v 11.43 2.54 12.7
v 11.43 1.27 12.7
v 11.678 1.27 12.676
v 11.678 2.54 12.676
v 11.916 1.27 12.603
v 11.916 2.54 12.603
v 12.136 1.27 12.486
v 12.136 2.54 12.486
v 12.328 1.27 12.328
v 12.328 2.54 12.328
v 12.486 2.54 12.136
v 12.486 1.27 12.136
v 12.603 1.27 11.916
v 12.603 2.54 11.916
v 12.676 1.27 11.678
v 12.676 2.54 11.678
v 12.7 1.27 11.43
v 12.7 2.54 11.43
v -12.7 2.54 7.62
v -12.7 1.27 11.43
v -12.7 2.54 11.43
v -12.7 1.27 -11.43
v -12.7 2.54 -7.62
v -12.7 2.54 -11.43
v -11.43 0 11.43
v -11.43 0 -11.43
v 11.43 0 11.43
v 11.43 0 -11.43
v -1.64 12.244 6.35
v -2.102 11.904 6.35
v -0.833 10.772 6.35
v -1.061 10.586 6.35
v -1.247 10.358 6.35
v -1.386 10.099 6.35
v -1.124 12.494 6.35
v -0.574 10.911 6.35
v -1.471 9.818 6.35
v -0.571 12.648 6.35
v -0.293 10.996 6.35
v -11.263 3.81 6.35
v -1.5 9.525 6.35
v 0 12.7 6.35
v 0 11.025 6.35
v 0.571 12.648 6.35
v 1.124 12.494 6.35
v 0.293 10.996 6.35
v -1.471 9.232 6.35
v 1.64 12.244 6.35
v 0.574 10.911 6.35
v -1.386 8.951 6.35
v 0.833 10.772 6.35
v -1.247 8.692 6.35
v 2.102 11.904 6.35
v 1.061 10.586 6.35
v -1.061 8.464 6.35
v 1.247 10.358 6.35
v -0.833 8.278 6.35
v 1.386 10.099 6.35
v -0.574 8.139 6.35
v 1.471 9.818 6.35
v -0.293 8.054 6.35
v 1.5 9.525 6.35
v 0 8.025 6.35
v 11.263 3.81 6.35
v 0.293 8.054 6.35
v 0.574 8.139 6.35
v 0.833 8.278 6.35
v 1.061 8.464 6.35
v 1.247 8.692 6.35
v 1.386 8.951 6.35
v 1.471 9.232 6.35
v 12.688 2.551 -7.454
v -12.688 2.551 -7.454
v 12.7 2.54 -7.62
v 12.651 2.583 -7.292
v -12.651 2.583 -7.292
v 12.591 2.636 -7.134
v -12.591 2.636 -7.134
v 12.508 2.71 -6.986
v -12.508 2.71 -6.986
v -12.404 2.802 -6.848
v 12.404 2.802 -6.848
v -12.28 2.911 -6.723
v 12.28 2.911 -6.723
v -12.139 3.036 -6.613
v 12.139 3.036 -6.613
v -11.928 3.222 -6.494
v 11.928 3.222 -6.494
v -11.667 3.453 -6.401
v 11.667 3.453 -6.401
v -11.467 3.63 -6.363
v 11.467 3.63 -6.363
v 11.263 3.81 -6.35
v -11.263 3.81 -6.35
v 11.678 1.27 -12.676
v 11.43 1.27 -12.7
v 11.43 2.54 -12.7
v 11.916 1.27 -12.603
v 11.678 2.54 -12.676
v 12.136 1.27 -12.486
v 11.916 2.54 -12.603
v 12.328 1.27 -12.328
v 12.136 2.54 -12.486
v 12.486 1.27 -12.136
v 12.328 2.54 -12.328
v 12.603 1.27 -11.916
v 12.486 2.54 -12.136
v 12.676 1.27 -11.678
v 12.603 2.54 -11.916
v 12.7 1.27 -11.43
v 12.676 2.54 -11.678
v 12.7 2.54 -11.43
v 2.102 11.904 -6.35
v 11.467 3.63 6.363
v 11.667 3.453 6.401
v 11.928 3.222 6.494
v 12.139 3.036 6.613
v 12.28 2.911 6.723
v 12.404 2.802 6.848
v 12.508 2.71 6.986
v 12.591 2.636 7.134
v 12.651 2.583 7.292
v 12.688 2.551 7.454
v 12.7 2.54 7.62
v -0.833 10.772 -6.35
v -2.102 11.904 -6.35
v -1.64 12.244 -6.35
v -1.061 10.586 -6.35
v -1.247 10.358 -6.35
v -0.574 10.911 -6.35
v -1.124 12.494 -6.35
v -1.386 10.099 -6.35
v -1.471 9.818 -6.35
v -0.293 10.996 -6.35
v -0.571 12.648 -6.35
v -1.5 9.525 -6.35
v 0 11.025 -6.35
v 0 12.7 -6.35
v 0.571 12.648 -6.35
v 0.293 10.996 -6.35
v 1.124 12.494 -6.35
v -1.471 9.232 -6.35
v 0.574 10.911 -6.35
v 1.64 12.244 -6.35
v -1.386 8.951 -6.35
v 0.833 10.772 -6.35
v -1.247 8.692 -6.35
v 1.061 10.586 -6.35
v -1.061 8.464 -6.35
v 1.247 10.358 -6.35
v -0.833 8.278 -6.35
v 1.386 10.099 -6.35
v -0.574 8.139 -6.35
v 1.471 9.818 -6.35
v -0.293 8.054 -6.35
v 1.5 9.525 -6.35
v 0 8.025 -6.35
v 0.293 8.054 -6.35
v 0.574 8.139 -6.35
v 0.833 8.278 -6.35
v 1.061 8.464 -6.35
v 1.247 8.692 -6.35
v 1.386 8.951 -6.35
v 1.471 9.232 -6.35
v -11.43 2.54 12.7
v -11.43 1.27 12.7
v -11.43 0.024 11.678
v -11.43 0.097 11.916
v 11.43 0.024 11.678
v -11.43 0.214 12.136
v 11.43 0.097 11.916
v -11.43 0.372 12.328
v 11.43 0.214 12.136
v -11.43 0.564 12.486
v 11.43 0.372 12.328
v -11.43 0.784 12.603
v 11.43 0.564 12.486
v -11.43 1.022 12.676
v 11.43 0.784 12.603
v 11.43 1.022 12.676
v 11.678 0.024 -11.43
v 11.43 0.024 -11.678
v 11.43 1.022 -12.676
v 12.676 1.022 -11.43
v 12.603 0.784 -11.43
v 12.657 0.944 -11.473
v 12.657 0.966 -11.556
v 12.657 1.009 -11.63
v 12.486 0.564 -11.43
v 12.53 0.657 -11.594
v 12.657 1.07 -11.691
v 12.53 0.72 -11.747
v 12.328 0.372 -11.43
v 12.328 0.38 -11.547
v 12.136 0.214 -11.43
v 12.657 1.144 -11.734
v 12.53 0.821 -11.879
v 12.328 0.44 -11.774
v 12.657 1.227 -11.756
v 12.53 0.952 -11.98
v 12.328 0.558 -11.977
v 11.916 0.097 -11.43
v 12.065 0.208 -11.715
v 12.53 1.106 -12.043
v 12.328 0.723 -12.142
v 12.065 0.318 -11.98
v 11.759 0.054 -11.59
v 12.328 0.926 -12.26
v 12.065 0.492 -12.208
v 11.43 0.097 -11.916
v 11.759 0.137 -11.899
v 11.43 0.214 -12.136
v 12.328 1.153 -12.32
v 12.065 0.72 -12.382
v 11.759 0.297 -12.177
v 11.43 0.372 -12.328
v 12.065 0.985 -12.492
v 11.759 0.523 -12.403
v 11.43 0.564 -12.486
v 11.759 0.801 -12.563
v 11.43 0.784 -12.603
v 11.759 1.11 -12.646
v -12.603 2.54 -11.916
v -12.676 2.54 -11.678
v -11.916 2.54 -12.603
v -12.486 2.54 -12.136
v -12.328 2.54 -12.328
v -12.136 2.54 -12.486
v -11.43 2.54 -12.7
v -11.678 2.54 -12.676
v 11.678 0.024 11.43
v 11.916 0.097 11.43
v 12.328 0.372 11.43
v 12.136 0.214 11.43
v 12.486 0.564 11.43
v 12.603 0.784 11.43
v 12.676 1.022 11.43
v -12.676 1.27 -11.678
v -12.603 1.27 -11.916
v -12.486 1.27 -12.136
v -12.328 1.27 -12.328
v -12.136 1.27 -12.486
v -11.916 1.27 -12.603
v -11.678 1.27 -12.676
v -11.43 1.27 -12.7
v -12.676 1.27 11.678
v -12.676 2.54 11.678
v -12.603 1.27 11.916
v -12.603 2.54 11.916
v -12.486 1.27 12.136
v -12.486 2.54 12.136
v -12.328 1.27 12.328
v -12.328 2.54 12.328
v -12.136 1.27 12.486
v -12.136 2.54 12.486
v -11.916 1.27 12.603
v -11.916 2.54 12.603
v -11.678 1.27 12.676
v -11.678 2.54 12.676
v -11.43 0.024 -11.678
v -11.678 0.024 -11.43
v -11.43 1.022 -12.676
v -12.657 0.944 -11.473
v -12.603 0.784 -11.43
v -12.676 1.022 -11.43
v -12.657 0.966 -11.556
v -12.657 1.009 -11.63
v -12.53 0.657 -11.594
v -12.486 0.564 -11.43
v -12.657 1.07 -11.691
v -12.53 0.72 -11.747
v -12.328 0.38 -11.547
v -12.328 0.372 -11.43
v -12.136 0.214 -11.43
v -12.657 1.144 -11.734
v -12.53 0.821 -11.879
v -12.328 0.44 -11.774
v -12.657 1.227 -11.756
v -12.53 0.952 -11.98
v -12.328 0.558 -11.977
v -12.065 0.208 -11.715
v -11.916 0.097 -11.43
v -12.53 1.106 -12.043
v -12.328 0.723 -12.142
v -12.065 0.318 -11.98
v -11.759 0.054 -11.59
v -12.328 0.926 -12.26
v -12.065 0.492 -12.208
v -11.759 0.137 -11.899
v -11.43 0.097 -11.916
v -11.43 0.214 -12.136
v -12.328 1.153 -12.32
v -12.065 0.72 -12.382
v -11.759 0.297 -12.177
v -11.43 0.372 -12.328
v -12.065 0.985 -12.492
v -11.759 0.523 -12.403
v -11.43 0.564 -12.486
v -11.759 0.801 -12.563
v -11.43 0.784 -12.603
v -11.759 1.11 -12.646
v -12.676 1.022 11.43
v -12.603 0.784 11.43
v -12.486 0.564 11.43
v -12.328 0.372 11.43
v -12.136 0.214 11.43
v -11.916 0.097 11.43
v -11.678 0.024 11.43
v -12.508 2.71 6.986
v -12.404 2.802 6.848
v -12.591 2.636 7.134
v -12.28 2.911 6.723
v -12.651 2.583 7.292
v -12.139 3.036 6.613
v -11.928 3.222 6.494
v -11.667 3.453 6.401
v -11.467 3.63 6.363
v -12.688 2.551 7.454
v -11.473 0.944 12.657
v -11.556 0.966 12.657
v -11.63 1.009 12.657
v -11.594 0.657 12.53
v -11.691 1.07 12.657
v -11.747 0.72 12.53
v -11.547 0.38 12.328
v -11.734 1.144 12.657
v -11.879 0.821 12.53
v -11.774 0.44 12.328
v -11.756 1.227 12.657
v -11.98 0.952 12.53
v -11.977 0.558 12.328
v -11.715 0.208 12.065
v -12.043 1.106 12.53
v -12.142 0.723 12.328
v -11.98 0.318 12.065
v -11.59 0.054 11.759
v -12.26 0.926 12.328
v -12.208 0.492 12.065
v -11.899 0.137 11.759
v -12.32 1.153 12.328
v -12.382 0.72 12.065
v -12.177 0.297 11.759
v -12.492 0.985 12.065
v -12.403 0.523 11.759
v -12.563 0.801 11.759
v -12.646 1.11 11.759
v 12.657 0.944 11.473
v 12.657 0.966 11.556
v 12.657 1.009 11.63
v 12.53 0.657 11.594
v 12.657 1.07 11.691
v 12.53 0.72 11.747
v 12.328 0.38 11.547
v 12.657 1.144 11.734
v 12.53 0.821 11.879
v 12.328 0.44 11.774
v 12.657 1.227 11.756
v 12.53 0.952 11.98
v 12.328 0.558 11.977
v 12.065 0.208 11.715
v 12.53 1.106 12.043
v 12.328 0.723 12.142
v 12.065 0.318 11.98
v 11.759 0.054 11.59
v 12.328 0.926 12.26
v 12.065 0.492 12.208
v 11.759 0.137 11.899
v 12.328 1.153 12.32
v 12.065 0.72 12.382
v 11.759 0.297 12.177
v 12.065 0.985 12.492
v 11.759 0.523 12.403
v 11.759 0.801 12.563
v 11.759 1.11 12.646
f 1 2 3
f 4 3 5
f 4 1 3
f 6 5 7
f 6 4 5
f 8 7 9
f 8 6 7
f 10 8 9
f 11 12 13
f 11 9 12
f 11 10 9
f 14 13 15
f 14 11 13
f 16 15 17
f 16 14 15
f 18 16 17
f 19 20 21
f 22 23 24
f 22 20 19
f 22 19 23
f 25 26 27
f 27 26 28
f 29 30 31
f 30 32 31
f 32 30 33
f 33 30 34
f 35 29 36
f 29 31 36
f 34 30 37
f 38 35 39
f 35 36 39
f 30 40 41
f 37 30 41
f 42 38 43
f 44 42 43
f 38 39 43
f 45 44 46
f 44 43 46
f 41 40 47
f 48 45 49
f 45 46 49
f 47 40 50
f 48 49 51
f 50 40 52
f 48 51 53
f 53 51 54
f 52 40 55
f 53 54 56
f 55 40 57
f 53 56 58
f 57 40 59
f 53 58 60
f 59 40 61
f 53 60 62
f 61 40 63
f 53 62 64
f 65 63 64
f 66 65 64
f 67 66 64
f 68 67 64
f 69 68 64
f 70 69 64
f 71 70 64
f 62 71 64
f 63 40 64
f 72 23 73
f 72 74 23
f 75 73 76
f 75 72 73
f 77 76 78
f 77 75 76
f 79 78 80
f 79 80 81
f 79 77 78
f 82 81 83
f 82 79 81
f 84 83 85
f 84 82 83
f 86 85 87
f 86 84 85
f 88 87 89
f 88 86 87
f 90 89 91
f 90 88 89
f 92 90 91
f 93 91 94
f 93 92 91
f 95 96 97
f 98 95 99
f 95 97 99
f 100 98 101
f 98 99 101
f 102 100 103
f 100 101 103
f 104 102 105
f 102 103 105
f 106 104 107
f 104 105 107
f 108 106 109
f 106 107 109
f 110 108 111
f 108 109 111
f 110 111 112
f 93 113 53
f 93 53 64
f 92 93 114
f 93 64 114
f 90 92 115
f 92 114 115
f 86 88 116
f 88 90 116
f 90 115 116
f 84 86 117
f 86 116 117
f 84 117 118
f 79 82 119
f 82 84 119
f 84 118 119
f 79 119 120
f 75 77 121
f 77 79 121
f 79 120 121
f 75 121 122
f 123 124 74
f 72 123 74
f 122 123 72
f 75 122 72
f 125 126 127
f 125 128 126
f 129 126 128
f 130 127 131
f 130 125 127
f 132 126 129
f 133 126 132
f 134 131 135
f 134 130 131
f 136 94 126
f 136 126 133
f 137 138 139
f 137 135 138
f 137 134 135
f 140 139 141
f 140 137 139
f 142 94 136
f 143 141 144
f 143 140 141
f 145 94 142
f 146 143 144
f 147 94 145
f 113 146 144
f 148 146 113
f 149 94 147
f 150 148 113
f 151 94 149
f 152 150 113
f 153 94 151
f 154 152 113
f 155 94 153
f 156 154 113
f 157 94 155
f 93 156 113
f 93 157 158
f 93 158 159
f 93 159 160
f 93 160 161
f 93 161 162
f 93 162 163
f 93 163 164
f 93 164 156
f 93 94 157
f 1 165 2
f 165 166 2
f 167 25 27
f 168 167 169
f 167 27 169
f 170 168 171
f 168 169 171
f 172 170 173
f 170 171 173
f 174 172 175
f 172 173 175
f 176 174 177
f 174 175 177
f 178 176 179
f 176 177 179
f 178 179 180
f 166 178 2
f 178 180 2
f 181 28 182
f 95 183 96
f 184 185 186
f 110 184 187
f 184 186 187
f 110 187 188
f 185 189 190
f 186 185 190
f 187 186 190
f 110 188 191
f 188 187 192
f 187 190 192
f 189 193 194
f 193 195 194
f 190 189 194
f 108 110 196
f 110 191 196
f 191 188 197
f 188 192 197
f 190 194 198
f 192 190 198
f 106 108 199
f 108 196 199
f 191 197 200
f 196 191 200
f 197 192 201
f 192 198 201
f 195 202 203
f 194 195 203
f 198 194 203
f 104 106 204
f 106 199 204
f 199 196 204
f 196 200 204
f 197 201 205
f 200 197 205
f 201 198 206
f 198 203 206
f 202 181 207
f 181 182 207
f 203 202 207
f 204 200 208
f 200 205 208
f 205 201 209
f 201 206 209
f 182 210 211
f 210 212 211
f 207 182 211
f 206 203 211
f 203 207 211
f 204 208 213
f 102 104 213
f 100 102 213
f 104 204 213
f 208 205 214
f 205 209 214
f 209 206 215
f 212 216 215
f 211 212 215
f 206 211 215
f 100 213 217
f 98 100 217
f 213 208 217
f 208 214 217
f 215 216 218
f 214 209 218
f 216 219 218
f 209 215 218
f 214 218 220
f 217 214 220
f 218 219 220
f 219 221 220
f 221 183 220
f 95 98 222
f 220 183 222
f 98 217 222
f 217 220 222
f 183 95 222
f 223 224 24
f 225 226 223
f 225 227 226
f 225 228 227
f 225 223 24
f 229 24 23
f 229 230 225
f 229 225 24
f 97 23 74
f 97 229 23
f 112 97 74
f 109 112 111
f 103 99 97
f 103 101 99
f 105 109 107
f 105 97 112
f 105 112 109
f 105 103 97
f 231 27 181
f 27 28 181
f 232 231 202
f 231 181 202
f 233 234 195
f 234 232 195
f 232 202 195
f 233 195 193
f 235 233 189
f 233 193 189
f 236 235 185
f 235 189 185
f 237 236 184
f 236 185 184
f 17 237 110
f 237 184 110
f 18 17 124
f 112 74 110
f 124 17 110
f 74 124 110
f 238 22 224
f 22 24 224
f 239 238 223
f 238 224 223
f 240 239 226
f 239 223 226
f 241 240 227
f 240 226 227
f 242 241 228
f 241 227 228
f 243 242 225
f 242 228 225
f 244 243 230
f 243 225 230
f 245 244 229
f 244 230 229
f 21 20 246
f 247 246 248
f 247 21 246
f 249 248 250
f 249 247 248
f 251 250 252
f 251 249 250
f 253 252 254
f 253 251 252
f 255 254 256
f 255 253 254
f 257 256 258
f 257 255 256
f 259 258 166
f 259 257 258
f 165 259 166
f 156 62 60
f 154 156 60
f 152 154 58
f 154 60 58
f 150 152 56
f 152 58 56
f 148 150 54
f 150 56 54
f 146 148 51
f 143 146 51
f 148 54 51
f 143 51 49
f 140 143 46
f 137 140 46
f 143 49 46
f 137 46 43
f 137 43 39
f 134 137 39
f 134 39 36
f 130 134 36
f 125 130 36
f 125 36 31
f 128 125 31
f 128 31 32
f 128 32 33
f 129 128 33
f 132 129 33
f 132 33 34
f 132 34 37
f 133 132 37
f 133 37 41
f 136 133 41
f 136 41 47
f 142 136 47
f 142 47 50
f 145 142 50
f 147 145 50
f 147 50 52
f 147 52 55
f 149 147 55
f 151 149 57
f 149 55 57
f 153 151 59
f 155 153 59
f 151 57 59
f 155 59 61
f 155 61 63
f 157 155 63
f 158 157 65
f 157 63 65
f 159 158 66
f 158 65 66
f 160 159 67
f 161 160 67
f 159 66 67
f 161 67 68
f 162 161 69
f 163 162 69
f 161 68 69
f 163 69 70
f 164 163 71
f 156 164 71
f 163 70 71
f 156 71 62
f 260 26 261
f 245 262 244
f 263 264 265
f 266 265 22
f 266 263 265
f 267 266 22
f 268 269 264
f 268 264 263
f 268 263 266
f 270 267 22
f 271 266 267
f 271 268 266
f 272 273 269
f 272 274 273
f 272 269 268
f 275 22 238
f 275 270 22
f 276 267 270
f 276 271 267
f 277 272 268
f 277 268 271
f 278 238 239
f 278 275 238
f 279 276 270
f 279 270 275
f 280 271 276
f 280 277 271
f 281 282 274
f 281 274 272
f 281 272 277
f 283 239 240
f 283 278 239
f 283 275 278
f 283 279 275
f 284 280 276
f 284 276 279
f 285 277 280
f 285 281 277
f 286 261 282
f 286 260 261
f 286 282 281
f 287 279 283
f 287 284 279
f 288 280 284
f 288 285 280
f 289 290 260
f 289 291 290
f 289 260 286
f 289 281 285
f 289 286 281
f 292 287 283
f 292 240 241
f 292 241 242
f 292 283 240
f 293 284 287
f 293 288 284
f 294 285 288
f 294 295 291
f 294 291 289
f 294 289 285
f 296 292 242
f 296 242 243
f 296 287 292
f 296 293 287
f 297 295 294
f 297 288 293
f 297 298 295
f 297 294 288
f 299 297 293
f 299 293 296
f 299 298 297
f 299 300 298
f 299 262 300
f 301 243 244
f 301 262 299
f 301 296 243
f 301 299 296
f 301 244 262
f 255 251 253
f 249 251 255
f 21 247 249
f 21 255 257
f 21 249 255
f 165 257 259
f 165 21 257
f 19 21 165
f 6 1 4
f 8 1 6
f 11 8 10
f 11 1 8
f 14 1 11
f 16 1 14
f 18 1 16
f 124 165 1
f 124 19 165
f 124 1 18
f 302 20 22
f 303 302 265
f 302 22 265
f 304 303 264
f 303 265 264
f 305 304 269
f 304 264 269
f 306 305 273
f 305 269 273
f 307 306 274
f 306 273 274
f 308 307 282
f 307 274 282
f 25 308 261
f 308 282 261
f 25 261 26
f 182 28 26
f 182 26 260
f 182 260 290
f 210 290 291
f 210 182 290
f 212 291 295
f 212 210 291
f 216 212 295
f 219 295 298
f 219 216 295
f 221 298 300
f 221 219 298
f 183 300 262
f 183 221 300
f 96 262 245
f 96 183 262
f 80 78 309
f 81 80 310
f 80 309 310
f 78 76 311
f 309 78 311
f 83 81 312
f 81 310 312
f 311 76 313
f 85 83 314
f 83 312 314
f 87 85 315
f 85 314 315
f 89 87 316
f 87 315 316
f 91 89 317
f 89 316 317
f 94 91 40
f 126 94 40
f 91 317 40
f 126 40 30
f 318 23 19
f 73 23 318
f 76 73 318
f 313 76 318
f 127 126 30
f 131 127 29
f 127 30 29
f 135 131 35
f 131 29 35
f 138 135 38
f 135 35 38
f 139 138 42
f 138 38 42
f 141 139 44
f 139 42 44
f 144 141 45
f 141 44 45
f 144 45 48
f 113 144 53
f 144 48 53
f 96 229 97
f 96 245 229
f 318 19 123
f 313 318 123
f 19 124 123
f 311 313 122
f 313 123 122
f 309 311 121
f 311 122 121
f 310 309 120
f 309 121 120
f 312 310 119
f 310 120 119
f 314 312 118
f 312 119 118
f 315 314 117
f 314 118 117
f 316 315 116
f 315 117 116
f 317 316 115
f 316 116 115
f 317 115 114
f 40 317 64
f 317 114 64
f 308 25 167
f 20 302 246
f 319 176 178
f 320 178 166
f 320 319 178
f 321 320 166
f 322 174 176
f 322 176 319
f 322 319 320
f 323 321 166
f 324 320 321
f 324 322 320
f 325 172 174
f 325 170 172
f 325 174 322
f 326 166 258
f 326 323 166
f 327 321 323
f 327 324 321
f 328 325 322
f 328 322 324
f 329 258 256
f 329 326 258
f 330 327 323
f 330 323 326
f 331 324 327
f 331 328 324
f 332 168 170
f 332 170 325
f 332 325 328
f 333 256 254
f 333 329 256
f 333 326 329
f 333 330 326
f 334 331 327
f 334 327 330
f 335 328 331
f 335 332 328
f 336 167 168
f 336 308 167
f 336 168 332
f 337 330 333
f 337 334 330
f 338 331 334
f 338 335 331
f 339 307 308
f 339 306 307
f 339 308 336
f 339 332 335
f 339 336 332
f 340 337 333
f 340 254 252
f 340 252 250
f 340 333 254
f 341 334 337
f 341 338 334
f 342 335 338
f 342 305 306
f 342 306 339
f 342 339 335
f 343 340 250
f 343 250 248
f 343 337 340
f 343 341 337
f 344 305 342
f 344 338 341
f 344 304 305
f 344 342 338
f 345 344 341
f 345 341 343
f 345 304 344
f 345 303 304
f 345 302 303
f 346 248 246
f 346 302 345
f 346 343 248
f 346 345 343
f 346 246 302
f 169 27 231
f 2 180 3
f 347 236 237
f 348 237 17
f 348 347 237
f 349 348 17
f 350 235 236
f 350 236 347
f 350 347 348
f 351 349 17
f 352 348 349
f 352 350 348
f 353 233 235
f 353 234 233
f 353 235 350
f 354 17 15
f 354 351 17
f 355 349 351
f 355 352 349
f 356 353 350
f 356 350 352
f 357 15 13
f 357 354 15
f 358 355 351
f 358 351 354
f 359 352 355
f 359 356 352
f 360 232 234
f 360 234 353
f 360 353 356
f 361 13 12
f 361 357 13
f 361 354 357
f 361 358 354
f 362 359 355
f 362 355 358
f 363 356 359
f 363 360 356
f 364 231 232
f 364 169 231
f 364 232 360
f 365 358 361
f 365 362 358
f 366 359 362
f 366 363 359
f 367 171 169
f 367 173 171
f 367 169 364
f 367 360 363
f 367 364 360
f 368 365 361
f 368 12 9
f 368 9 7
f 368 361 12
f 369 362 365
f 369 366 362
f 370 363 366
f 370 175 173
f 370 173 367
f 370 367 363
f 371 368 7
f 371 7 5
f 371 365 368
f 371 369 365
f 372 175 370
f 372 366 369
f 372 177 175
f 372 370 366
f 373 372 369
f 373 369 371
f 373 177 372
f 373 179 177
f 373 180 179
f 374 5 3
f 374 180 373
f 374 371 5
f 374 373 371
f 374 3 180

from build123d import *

# Parameters (mm, degrees)
SKETCH1_W           = 25.4
SKETCH1_H           = 25.4
BOSS_EXTRUDE1_DEPTH = 2.54
SKETCH2_W           = 25.4
SKETCH2_H           = 12.7
BOSS_EXTRUDE2_DEPTH = 12.7
SKETCH3_R           = 1.5
CUT_EXTRUDE1_DEPTH  = 28.503637941
FILLET1_R           = 1.27


with BuildPart() as part:
    # Sketch1 → Boss-Extrude1 (new body)
    with BuildSketch(Plane(origin=(0, 0, 0), x_dir=(1, 0, 0), z_dir=(0, 1, 0))):
        Rectangle(SKETCH1_W, SKETCH1_H)
    extrude(amount=BOSS_EXTRUDE1_DEPTH)

    # Sketch2 → Boss-Extrude2 (add)
    with BuildSketch(Plane(origin=(0, 2.54, 0), x_dir=(1, 0, 0), z_dir=(0, 1, 0))):
        Rectangle(SKETCH2_W, SKETCH2_H)
    extrude(amount=BOSS_EXTRUDE2_DEPTH)

    # Sketch3 → Cut-Extrude1 (cut, through all)
    with BuildSketch(Plane.XY.offset(6.35)):
        with BuildLine():
            Line((-12.7, 2.54), (-2.102335281, 11.904245966))
            ThreePointArc((-2.102335281, 11.904245966), (0, 12.7), (2.102335281, 11.904245966))
            Line((2.102335281, 11.904245966), (12.7, 2.54))
            Line((12.7, 2.54), (12.7, 15.24))
            Line((12.7, 15.24), (-12.7, 15.24))
            Line((-12.7, 15.24), (-12.7, 2.54))
        make_face()
        with Locations((0, 9.525)):
            Circle(SKETCH3_R)
    extrude(amount=-CUT_EXTRUDE1_DEPTH, mode=Mode.SUBTRACT)

    # Fillet1
    fillet1_edges = [part.edges().sort_by_distance(p)[0] for p in [
        (0, 0, -12.7),
        (-12.7, 0, 0),
        (0, 0, 12.7),
        (12.7, 0, 0),
        (-12.7, 1.27, 12.7),
        (12.7, 1.27, 12.7),
        (-12.7, 1.27, -12.7),
        (12.7, 1.27, -12.7),
        (0, 2.54, -6.35),
        (0, 2.54, 6.35),
    ]]
    fillet(fillet1_edges, radius=FILLET1_R)


solid = part.part
